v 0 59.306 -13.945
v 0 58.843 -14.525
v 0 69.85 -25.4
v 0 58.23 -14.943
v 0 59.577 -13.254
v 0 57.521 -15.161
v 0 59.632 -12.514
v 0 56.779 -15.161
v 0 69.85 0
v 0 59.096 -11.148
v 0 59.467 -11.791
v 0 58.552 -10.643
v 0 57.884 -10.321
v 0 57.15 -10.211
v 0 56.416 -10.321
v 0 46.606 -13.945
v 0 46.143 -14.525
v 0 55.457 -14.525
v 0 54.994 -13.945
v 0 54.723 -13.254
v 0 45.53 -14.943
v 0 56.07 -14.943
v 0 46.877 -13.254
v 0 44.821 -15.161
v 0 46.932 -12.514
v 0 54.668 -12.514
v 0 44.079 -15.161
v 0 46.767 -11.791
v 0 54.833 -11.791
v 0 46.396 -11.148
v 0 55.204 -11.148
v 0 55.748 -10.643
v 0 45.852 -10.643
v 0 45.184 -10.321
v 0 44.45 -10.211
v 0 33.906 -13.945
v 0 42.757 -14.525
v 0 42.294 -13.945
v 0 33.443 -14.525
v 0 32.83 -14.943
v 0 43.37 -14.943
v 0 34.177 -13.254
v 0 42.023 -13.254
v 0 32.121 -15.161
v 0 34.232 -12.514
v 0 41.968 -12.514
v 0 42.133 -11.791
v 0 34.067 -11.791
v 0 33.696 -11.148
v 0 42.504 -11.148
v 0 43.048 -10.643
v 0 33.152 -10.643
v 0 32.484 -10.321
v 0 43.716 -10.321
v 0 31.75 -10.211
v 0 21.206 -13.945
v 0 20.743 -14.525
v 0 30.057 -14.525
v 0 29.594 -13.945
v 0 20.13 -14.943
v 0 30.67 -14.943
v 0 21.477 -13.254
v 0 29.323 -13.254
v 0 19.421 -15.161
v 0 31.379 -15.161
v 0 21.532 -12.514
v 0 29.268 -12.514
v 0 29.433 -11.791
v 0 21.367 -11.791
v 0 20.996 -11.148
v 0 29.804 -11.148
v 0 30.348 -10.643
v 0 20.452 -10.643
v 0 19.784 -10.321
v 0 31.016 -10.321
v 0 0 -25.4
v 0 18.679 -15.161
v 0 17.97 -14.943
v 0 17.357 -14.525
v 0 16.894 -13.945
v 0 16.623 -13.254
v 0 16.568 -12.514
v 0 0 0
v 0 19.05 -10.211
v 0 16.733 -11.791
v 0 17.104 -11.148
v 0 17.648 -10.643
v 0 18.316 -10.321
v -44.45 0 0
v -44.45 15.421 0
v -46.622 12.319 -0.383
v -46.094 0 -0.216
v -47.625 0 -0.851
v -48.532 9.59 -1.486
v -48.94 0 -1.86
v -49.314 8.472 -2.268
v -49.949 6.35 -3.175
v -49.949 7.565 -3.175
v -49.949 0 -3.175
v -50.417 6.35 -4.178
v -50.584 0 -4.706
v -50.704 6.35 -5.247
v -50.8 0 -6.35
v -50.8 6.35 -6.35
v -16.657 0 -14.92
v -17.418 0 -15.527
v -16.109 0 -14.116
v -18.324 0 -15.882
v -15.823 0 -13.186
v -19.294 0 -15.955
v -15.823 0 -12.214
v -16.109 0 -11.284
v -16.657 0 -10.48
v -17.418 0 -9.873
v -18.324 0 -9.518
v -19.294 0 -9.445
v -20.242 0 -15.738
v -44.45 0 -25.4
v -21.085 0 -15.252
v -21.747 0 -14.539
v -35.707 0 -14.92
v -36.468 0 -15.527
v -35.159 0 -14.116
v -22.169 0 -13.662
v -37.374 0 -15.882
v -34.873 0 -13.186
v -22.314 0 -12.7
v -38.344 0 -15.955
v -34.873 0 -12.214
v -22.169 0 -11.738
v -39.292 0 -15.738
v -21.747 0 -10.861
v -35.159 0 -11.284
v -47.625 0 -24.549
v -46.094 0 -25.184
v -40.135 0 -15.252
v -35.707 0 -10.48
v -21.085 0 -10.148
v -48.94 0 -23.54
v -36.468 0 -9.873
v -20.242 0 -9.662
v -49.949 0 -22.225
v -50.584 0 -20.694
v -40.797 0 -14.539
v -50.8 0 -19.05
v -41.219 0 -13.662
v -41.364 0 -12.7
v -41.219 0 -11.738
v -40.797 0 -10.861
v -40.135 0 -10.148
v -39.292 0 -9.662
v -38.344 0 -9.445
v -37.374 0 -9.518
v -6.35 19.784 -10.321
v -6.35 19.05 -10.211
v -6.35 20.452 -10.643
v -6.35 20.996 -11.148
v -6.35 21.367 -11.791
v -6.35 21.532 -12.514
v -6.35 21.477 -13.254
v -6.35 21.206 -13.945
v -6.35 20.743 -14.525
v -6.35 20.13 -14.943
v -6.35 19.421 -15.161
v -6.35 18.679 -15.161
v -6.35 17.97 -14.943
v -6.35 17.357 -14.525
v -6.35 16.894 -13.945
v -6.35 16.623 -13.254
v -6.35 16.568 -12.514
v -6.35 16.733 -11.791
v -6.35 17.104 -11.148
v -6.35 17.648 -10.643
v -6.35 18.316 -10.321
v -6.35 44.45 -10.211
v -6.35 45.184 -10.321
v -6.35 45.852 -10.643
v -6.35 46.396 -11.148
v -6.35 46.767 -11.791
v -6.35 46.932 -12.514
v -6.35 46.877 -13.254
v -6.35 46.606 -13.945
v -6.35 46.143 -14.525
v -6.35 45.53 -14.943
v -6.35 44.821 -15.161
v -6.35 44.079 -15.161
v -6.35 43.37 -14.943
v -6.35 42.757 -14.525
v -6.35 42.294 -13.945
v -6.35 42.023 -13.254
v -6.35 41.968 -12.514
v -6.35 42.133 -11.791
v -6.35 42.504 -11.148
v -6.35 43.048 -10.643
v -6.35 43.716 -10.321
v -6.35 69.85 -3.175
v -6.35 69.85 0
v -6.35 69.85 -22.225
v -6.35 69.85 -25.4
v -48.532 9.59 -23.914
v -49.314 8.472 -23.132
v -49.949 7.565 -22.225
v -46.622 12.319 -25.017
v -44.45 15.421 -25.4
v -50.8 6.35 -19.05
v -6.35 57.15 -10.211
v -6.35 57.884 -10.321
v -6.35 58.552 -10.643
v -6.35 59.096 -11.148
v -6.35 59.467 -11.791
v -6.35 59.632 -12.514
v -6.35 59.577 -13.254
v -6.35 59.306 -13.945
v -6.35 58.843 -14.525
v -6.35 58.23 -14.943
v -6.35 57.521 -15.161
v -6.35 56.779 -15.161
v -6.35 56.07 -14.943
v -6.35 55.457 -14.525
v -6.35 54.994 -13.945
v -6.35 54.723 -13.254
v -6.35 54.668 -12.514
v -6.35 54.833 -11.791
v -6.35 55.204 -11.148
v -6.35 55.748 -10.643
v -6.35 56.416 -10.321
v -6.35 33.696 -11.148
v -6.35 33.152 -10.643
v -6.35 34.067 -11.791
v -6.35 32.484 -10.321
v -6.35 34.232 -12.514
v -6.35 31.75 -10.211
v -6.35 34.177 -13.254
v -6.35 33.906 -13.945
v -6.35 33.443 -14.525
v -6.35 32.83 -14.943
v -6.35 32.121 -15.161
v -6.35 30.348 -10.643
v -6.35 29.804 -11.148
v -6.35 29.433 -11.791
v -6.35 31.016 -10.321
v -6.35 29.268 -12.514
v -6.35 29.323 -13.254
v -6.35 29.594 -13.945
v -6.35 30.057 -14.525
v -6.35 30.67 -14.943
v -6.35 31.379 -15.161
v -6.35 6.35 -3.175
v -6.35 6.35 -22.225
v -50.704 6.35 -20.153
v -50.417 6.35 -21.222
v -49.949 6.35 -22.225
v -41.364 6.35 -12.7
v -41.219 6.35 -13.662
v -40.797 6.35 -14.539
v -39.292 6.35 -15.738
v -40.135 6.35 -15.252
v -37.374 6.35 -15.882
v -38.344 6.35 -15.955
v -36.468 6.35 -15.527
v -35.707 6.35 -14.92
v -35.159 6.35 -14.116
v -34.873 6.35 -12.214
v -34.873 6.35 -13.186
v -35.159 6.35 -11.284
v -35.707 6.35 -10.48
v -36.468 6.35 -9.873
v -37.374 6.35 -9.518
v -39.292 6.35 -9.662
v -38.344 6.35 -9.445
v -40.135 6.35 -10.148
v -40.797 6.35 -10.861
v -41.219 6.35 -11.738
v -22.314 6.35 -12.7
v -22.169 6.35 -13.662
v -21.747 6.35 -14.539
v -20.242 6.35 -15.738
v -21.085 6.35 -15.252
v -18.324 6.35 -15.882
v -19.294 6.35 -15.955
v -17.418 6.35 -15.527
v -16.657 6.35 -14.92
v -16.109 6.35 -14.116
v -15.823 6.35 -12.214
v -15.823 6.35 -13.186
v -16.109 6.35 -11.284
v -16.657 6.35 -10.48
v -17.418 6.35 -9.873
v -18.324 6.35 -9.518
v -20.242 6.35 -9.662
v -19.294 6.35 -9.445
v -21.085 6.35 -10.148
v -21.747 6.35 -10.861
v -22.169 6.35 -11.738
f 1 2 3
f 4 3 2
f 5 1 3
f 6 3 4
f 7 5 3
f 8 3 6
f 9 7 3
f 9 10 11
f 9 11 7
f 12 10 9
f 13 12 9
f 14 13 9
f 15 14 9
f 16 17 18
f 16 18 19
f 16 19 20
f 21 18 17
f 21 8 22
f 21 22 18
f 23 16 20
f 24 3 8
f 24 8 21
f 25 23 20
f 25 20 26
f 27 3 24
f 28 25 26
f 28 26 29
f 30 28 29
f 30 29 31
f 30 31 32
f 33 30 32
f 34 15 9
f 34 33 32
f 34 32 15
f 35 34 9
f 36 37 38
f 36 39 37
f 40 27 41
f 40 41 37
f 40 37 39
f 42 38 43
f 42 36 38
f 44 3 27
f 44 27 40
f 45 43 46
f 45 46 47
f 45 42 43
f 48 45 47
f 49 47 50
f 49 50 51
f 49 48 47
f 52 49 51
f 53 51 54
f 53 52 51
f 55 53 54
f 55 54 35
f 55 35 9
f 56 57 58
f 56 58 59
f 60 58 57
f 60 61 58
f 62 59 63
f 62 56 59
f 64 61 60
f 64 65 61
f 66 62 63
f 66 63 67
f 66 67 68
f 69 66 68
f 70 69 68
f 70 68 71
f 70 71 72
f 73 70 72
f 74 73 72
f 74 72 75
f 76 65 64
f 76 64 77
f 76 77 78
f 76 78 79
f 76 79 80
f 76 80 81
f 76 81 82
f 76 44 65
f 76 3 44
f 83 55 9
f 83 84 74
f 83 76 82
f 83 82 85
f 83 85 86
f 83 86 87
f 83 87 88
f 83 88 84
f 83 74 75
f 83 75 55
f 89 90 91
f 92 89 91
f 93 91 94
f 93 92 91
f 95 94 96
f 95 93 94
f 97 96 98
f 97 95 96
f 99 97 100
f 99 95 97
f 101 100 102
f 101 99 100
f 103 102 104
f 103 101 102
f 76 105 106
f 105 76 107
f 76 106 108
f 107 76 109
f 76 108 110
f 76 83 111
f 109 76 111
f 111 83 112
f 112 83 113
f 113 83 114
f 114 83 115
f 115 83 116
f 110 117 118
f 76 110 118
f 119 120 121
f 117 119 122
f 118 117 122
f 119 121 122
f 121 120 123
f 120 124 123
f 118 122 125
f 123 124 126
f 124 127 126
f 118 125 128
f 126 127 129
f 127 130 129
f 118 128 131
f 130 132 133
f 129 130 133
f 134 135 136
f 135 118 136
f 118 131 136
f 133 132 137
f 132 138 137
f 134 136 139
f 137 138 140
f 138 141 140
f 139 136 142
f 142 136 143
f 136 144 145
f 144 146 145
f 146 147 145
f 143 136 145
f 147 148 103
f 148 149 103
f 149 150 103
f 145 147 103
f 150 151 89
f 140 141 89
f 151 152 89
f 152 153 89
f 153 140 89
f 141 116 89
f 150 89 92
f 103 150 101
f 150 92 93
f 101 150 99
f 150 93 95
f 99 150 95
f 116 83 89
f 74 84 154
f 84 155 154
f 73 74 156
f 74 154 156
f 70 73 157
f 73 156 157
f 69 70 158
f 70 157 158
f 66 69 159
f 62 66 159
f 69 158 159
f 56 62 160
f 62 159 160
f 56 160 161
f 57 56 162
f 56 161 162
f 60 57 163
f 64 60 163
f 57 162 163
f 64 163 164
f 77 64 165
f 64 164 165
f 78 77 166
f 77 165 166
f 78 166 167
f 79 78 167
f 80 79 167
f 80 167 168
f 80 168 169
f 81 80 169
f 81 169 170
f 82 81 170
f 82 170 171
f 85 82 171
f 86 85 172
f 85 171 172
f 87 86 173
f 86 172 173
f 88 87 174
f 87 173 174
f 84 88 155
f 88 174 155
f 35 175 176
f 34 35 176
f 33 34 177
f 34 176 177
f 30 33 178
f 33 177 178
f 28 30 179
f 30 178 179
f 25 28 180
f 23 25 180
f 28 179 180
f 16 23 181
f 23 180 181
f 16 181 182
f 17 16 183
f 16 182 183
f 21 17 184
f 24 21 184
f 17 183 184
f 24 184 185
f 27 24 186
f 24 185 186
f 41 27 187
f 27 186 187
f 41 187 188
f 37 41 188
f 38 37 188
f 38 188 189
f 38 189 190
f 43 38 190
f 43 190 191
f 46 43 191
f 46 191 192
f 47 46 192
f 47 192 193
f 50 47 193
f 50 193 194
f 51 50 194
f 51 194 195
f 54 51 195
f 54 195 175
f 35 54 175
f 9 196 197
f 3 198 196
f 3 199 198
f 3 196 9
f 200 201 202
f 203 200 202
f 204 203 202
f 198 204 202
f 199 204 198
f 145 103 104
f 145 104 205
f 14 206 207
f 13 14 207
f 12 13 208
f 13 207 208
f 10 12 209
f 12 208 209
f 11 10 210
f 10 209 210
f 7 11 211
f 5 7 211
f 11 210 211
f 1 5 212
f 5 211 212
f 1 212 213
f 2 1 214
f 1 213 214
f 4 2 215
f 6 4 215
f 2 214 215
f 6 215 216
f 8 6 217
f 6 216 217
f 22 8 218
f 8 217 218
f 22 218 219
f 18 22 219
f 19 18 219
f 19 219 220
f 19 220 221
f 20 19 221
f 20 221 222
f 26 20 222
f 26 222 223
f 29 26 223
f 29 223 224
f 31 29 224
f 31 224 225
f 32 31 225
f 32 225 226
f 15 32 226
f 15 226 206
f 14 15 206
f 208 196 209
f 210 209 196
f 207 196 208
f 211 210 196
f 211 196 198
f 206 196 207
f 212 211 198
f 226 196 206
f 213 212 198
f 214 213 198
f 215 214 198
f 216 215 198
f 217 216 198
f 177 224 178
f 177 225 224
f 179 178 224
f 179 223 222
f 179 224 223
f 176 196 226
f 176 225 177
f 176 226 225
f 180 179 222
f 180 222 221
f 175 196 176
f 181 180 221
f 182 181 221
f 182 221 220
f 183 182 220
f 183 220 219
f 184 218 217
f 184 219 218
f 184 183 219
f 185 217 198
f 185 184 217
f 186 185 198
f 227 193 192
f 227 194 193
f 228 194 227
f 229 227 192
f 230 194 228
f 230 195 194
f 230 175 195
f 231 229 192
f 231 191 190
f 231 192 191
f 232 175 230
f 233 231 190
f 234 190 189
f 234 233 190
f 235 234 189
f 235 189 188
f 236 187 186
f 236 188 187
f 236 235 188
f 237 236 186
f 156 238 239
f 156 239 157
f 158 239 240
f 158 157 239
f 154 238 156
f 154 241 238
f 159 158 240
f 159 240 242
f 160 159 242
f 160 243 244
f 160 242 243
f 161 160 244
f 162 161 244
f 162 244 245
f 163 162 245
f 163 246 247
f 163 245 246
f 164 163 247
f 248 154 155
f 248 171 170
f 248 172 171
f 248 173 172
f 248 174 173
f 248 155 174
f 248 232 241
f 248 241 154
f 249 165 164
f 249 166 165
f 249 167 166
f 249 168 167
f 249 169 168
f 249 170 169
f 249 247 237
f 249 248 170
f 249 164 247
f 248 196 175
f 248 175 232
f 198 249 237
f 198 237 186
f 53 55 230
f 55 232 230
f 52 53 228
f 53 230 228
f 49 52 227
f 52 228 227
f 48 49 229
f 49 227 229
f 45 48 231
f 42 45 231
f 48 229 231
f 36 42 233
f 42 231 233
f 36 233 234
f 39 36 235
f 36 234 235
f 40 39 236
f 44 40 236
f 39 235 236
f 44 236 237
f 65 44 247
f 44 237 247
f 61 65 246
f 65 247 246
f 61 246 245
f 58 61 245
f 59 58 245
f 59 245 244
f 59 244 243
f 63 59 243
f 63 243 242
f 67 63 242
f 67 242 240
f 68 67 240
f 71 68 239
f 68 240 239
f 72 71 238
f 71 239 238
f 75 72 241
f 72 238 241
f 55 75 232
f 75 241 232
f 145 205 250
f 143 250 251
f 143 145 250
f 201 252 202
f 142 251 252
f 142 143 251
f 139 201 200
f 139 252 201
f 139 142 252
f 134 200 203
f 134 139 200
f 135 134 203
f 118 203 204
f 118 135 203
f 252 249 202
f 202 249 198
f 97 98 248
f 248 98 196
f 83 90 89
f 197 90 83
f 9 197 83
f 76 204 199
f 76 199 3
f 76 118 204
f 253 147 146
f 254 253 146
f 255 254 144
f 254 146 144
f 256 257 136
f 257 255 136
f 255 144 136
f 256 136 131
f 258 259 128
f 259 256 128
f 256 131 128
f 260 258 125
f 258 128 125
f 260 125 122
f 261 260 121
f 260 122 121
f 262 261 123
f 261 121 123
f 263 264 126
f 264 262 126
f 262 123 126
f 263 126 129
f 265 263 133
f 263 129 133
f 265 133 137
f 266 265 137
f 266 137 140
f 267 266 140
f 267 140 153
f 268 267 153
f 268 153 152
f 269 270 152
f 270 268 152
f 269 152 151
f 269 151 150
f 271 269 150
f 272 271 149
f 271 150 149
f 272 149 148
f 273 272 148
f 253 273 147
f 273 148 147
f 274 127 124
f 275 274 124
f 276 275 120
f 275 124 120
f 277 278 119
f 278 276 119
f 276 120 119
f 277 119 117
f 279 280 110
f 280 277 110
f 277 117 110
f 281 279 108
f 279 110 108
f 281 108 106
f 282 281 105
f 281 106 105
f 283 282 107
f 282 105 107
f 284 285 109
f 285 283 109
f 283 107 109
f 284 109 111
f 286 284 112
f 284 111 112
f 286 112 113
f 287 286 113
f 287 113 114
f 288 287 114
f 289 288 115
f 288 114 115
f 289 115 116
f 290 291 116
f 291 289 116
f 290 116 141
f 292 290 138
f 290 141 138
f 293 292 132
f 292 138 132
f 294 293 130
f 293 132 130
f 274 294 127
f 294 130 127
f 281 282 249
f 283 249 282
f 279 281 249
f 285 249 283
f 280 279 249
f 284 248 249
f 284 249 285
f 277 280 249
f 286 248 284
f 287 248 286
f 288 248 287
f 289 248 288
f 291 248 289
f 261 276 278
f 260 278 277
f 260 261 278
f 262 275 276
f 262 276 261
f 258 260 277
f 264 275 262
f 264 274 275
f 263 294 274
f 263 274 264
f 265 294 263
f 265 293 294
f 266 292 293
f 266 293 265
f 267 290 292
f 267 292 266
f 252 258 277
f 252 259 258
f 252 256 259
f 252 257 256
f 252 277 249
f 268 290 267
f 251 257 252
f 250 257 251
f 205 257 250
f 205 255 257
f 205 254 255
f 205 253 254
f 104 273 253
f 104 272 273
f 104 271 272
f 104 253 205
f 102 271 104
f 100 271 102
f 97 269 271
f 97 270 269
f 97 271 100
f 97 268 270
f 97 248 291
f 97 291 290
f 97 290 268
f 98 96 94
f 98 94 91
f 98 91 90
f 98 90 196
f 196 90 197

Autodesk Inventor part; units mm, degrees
ref_plane "YZ Plane" through (0, 0, 0) normal (1, 0, 0) x (0, 1, 0)
ref_plane "XZ Plane" through (0, 0, 0) normal (0, 1, 0) x (-1, 0, 0)
ref_plane "XY Plane" through (0, 0, 0) normal (0, 0, 1) x (1, 0, 0)
sketch "Sketch1" plane through (0, 0, 0) normal (0, 1, 0) x (-1, 0, 0)
  line L0 (0, 0) -> (50.8, 0)
  line L1 (50.8, 0) -> (50.8, -25.4)
  line L2 (50.8, -25.4) -> (0, -25.4)
  line L3 (0, -25.4) -> (0, 0)
  circle A0 centre (19.05, -12.7) radius 3.2639
  circle A1 centre (38.1, -12.7) radius 3.2639
  point P0 (0, -12.7)
  dimension "d0" = 50.8
  dimension "d1" = 25.4
  dimension "d2" = 6.5278
  dimension "d3" = 19.05
  dimension "d4" = 19.05
  dimension "d5" = 12.7
extrude "Extrusion1" add sketch "Sketch1" along normal blind 6.35
sketch "Sketch2" plane through (0, 6.35, 0) normal (0, 1, 0) x (1, 0, 0)
  line L0 (0, 25.4) -> (-50.8, 25.4) projected
  line L1 (0, 0) -> (-6.35, 0)
  line L2 (-6.35, 0) -> (-6.35, 25.4)
  line L3 (-6.35, 25.4) -> (0, 25.4)
  line L4 (0, 25.4) -> (0, 0)
  dimension "d8" = 6.35
extrude "Extrusion2" add sketch "Sketch2" along normal blind 63.5
sketch "Sketch3" plane through (-6.35, 6.35, -25.4) normal (-1, 0, 0) x (0, 0, 1)
  circle A0 centre (12.7, 12.7) radius 2.4892
  circle A1 centre (12.7, 38.1) radius 2.4892
  line L0 (0, 0) -> (25.4, 0) projected
  line L1 (25.4, 0) -> (25.4, 63.5) projected
  circle A2 centre (12.7, 50.8) radius 2.4892
  circle A3 centre (12.7, 25.4) radius 2.4892
  point P0 (25.4, -6.35)
  dimension "d11" = 4.9784
  dimension "d12" = 4.9784
  dimension "d13" = 25.4
  dimension "d14" = 12.7
  dimension "d15" = 12.7
  dimension "d23" = 12.7
  dimension "d24" = 12.7
extrude "Extrusion3" cut sketch "Sketch3" against normal through all
sketch "Sketch4" plane through (-50.8, 0, 0) normal (0, 0, 1) x (1, 0, 0)
  line L0 (0, 6.35) -> (44.45, 6.35) projected
  line L1 (0, 0) -> (50.8, 0) projected
  line L2 (50.8, 0) -> (50.8, 69.85) projected
  line L3 (44.45, 69.85) -> (50.8, 69.85) projected
  line L4 (44.45, 6.35) -> (44.45, 69.85) projected
  line L5 (0, 6.35) -> (44.45, 6.35) projected
  line L6 (0, 0) -> (0, 6.35) projected
  line L7 (0, 6.35) -> (44.45, 69.85)
  line L8 (50.8, 69.85) -> (50.8, 0)
  line L9 (0, 0) -> (0, 6.35)
  line L10 (50.8, 0) -> (0, 0)
  line L11 (44.45, 69.85) -> (50.8, 69.85)
extrude "Extrusion4" add sketch "Sketch4" against normal blind 3.175 contours L7 L4 L0
sketch "Sketch5" plane through (0, 0, -25.4) normal (0, 0, -1) x (-1, 0, 0)
  line L0 (0, 0) -> (50.8, 0) projected
  line L1 (50.8, 0) -> (50.8, 6.35) projected
  line L2 (6.35, 6.35) -> (50.8, 6.35) projected
  line L3 (6.35, 6.35) -> (6.35, 69.85) projected
  line L4 (0, 69.85) -> (6.35, 69.85) projected
  line L5 (0, 0) -> (0, 69.85) projected
  line L6 (50.8, 6.35) -> (50.8, 0)
  line L7 (0, 0) -> (50.8, 0)
  line L8 (50.8, 6.35) -> (6.35, 69.85)
  line L9 (0, 0) -> (0, 69.85) projected
  line L10 (6.35, 69.85) -> (0, 69.85)
  line L11 (0, 69.85) -> (0, 0)
extrude "Extrusion5" add sketch "Sketch5" against normal blind 3.175
fillet "Fillet1" radius 6.35 2 edges at (-50.8, 3.175, -25.4) (-50.8, 3.175, 0)
properties part number "INDX_005_Cornerbracket" material "ABS Plastic"
